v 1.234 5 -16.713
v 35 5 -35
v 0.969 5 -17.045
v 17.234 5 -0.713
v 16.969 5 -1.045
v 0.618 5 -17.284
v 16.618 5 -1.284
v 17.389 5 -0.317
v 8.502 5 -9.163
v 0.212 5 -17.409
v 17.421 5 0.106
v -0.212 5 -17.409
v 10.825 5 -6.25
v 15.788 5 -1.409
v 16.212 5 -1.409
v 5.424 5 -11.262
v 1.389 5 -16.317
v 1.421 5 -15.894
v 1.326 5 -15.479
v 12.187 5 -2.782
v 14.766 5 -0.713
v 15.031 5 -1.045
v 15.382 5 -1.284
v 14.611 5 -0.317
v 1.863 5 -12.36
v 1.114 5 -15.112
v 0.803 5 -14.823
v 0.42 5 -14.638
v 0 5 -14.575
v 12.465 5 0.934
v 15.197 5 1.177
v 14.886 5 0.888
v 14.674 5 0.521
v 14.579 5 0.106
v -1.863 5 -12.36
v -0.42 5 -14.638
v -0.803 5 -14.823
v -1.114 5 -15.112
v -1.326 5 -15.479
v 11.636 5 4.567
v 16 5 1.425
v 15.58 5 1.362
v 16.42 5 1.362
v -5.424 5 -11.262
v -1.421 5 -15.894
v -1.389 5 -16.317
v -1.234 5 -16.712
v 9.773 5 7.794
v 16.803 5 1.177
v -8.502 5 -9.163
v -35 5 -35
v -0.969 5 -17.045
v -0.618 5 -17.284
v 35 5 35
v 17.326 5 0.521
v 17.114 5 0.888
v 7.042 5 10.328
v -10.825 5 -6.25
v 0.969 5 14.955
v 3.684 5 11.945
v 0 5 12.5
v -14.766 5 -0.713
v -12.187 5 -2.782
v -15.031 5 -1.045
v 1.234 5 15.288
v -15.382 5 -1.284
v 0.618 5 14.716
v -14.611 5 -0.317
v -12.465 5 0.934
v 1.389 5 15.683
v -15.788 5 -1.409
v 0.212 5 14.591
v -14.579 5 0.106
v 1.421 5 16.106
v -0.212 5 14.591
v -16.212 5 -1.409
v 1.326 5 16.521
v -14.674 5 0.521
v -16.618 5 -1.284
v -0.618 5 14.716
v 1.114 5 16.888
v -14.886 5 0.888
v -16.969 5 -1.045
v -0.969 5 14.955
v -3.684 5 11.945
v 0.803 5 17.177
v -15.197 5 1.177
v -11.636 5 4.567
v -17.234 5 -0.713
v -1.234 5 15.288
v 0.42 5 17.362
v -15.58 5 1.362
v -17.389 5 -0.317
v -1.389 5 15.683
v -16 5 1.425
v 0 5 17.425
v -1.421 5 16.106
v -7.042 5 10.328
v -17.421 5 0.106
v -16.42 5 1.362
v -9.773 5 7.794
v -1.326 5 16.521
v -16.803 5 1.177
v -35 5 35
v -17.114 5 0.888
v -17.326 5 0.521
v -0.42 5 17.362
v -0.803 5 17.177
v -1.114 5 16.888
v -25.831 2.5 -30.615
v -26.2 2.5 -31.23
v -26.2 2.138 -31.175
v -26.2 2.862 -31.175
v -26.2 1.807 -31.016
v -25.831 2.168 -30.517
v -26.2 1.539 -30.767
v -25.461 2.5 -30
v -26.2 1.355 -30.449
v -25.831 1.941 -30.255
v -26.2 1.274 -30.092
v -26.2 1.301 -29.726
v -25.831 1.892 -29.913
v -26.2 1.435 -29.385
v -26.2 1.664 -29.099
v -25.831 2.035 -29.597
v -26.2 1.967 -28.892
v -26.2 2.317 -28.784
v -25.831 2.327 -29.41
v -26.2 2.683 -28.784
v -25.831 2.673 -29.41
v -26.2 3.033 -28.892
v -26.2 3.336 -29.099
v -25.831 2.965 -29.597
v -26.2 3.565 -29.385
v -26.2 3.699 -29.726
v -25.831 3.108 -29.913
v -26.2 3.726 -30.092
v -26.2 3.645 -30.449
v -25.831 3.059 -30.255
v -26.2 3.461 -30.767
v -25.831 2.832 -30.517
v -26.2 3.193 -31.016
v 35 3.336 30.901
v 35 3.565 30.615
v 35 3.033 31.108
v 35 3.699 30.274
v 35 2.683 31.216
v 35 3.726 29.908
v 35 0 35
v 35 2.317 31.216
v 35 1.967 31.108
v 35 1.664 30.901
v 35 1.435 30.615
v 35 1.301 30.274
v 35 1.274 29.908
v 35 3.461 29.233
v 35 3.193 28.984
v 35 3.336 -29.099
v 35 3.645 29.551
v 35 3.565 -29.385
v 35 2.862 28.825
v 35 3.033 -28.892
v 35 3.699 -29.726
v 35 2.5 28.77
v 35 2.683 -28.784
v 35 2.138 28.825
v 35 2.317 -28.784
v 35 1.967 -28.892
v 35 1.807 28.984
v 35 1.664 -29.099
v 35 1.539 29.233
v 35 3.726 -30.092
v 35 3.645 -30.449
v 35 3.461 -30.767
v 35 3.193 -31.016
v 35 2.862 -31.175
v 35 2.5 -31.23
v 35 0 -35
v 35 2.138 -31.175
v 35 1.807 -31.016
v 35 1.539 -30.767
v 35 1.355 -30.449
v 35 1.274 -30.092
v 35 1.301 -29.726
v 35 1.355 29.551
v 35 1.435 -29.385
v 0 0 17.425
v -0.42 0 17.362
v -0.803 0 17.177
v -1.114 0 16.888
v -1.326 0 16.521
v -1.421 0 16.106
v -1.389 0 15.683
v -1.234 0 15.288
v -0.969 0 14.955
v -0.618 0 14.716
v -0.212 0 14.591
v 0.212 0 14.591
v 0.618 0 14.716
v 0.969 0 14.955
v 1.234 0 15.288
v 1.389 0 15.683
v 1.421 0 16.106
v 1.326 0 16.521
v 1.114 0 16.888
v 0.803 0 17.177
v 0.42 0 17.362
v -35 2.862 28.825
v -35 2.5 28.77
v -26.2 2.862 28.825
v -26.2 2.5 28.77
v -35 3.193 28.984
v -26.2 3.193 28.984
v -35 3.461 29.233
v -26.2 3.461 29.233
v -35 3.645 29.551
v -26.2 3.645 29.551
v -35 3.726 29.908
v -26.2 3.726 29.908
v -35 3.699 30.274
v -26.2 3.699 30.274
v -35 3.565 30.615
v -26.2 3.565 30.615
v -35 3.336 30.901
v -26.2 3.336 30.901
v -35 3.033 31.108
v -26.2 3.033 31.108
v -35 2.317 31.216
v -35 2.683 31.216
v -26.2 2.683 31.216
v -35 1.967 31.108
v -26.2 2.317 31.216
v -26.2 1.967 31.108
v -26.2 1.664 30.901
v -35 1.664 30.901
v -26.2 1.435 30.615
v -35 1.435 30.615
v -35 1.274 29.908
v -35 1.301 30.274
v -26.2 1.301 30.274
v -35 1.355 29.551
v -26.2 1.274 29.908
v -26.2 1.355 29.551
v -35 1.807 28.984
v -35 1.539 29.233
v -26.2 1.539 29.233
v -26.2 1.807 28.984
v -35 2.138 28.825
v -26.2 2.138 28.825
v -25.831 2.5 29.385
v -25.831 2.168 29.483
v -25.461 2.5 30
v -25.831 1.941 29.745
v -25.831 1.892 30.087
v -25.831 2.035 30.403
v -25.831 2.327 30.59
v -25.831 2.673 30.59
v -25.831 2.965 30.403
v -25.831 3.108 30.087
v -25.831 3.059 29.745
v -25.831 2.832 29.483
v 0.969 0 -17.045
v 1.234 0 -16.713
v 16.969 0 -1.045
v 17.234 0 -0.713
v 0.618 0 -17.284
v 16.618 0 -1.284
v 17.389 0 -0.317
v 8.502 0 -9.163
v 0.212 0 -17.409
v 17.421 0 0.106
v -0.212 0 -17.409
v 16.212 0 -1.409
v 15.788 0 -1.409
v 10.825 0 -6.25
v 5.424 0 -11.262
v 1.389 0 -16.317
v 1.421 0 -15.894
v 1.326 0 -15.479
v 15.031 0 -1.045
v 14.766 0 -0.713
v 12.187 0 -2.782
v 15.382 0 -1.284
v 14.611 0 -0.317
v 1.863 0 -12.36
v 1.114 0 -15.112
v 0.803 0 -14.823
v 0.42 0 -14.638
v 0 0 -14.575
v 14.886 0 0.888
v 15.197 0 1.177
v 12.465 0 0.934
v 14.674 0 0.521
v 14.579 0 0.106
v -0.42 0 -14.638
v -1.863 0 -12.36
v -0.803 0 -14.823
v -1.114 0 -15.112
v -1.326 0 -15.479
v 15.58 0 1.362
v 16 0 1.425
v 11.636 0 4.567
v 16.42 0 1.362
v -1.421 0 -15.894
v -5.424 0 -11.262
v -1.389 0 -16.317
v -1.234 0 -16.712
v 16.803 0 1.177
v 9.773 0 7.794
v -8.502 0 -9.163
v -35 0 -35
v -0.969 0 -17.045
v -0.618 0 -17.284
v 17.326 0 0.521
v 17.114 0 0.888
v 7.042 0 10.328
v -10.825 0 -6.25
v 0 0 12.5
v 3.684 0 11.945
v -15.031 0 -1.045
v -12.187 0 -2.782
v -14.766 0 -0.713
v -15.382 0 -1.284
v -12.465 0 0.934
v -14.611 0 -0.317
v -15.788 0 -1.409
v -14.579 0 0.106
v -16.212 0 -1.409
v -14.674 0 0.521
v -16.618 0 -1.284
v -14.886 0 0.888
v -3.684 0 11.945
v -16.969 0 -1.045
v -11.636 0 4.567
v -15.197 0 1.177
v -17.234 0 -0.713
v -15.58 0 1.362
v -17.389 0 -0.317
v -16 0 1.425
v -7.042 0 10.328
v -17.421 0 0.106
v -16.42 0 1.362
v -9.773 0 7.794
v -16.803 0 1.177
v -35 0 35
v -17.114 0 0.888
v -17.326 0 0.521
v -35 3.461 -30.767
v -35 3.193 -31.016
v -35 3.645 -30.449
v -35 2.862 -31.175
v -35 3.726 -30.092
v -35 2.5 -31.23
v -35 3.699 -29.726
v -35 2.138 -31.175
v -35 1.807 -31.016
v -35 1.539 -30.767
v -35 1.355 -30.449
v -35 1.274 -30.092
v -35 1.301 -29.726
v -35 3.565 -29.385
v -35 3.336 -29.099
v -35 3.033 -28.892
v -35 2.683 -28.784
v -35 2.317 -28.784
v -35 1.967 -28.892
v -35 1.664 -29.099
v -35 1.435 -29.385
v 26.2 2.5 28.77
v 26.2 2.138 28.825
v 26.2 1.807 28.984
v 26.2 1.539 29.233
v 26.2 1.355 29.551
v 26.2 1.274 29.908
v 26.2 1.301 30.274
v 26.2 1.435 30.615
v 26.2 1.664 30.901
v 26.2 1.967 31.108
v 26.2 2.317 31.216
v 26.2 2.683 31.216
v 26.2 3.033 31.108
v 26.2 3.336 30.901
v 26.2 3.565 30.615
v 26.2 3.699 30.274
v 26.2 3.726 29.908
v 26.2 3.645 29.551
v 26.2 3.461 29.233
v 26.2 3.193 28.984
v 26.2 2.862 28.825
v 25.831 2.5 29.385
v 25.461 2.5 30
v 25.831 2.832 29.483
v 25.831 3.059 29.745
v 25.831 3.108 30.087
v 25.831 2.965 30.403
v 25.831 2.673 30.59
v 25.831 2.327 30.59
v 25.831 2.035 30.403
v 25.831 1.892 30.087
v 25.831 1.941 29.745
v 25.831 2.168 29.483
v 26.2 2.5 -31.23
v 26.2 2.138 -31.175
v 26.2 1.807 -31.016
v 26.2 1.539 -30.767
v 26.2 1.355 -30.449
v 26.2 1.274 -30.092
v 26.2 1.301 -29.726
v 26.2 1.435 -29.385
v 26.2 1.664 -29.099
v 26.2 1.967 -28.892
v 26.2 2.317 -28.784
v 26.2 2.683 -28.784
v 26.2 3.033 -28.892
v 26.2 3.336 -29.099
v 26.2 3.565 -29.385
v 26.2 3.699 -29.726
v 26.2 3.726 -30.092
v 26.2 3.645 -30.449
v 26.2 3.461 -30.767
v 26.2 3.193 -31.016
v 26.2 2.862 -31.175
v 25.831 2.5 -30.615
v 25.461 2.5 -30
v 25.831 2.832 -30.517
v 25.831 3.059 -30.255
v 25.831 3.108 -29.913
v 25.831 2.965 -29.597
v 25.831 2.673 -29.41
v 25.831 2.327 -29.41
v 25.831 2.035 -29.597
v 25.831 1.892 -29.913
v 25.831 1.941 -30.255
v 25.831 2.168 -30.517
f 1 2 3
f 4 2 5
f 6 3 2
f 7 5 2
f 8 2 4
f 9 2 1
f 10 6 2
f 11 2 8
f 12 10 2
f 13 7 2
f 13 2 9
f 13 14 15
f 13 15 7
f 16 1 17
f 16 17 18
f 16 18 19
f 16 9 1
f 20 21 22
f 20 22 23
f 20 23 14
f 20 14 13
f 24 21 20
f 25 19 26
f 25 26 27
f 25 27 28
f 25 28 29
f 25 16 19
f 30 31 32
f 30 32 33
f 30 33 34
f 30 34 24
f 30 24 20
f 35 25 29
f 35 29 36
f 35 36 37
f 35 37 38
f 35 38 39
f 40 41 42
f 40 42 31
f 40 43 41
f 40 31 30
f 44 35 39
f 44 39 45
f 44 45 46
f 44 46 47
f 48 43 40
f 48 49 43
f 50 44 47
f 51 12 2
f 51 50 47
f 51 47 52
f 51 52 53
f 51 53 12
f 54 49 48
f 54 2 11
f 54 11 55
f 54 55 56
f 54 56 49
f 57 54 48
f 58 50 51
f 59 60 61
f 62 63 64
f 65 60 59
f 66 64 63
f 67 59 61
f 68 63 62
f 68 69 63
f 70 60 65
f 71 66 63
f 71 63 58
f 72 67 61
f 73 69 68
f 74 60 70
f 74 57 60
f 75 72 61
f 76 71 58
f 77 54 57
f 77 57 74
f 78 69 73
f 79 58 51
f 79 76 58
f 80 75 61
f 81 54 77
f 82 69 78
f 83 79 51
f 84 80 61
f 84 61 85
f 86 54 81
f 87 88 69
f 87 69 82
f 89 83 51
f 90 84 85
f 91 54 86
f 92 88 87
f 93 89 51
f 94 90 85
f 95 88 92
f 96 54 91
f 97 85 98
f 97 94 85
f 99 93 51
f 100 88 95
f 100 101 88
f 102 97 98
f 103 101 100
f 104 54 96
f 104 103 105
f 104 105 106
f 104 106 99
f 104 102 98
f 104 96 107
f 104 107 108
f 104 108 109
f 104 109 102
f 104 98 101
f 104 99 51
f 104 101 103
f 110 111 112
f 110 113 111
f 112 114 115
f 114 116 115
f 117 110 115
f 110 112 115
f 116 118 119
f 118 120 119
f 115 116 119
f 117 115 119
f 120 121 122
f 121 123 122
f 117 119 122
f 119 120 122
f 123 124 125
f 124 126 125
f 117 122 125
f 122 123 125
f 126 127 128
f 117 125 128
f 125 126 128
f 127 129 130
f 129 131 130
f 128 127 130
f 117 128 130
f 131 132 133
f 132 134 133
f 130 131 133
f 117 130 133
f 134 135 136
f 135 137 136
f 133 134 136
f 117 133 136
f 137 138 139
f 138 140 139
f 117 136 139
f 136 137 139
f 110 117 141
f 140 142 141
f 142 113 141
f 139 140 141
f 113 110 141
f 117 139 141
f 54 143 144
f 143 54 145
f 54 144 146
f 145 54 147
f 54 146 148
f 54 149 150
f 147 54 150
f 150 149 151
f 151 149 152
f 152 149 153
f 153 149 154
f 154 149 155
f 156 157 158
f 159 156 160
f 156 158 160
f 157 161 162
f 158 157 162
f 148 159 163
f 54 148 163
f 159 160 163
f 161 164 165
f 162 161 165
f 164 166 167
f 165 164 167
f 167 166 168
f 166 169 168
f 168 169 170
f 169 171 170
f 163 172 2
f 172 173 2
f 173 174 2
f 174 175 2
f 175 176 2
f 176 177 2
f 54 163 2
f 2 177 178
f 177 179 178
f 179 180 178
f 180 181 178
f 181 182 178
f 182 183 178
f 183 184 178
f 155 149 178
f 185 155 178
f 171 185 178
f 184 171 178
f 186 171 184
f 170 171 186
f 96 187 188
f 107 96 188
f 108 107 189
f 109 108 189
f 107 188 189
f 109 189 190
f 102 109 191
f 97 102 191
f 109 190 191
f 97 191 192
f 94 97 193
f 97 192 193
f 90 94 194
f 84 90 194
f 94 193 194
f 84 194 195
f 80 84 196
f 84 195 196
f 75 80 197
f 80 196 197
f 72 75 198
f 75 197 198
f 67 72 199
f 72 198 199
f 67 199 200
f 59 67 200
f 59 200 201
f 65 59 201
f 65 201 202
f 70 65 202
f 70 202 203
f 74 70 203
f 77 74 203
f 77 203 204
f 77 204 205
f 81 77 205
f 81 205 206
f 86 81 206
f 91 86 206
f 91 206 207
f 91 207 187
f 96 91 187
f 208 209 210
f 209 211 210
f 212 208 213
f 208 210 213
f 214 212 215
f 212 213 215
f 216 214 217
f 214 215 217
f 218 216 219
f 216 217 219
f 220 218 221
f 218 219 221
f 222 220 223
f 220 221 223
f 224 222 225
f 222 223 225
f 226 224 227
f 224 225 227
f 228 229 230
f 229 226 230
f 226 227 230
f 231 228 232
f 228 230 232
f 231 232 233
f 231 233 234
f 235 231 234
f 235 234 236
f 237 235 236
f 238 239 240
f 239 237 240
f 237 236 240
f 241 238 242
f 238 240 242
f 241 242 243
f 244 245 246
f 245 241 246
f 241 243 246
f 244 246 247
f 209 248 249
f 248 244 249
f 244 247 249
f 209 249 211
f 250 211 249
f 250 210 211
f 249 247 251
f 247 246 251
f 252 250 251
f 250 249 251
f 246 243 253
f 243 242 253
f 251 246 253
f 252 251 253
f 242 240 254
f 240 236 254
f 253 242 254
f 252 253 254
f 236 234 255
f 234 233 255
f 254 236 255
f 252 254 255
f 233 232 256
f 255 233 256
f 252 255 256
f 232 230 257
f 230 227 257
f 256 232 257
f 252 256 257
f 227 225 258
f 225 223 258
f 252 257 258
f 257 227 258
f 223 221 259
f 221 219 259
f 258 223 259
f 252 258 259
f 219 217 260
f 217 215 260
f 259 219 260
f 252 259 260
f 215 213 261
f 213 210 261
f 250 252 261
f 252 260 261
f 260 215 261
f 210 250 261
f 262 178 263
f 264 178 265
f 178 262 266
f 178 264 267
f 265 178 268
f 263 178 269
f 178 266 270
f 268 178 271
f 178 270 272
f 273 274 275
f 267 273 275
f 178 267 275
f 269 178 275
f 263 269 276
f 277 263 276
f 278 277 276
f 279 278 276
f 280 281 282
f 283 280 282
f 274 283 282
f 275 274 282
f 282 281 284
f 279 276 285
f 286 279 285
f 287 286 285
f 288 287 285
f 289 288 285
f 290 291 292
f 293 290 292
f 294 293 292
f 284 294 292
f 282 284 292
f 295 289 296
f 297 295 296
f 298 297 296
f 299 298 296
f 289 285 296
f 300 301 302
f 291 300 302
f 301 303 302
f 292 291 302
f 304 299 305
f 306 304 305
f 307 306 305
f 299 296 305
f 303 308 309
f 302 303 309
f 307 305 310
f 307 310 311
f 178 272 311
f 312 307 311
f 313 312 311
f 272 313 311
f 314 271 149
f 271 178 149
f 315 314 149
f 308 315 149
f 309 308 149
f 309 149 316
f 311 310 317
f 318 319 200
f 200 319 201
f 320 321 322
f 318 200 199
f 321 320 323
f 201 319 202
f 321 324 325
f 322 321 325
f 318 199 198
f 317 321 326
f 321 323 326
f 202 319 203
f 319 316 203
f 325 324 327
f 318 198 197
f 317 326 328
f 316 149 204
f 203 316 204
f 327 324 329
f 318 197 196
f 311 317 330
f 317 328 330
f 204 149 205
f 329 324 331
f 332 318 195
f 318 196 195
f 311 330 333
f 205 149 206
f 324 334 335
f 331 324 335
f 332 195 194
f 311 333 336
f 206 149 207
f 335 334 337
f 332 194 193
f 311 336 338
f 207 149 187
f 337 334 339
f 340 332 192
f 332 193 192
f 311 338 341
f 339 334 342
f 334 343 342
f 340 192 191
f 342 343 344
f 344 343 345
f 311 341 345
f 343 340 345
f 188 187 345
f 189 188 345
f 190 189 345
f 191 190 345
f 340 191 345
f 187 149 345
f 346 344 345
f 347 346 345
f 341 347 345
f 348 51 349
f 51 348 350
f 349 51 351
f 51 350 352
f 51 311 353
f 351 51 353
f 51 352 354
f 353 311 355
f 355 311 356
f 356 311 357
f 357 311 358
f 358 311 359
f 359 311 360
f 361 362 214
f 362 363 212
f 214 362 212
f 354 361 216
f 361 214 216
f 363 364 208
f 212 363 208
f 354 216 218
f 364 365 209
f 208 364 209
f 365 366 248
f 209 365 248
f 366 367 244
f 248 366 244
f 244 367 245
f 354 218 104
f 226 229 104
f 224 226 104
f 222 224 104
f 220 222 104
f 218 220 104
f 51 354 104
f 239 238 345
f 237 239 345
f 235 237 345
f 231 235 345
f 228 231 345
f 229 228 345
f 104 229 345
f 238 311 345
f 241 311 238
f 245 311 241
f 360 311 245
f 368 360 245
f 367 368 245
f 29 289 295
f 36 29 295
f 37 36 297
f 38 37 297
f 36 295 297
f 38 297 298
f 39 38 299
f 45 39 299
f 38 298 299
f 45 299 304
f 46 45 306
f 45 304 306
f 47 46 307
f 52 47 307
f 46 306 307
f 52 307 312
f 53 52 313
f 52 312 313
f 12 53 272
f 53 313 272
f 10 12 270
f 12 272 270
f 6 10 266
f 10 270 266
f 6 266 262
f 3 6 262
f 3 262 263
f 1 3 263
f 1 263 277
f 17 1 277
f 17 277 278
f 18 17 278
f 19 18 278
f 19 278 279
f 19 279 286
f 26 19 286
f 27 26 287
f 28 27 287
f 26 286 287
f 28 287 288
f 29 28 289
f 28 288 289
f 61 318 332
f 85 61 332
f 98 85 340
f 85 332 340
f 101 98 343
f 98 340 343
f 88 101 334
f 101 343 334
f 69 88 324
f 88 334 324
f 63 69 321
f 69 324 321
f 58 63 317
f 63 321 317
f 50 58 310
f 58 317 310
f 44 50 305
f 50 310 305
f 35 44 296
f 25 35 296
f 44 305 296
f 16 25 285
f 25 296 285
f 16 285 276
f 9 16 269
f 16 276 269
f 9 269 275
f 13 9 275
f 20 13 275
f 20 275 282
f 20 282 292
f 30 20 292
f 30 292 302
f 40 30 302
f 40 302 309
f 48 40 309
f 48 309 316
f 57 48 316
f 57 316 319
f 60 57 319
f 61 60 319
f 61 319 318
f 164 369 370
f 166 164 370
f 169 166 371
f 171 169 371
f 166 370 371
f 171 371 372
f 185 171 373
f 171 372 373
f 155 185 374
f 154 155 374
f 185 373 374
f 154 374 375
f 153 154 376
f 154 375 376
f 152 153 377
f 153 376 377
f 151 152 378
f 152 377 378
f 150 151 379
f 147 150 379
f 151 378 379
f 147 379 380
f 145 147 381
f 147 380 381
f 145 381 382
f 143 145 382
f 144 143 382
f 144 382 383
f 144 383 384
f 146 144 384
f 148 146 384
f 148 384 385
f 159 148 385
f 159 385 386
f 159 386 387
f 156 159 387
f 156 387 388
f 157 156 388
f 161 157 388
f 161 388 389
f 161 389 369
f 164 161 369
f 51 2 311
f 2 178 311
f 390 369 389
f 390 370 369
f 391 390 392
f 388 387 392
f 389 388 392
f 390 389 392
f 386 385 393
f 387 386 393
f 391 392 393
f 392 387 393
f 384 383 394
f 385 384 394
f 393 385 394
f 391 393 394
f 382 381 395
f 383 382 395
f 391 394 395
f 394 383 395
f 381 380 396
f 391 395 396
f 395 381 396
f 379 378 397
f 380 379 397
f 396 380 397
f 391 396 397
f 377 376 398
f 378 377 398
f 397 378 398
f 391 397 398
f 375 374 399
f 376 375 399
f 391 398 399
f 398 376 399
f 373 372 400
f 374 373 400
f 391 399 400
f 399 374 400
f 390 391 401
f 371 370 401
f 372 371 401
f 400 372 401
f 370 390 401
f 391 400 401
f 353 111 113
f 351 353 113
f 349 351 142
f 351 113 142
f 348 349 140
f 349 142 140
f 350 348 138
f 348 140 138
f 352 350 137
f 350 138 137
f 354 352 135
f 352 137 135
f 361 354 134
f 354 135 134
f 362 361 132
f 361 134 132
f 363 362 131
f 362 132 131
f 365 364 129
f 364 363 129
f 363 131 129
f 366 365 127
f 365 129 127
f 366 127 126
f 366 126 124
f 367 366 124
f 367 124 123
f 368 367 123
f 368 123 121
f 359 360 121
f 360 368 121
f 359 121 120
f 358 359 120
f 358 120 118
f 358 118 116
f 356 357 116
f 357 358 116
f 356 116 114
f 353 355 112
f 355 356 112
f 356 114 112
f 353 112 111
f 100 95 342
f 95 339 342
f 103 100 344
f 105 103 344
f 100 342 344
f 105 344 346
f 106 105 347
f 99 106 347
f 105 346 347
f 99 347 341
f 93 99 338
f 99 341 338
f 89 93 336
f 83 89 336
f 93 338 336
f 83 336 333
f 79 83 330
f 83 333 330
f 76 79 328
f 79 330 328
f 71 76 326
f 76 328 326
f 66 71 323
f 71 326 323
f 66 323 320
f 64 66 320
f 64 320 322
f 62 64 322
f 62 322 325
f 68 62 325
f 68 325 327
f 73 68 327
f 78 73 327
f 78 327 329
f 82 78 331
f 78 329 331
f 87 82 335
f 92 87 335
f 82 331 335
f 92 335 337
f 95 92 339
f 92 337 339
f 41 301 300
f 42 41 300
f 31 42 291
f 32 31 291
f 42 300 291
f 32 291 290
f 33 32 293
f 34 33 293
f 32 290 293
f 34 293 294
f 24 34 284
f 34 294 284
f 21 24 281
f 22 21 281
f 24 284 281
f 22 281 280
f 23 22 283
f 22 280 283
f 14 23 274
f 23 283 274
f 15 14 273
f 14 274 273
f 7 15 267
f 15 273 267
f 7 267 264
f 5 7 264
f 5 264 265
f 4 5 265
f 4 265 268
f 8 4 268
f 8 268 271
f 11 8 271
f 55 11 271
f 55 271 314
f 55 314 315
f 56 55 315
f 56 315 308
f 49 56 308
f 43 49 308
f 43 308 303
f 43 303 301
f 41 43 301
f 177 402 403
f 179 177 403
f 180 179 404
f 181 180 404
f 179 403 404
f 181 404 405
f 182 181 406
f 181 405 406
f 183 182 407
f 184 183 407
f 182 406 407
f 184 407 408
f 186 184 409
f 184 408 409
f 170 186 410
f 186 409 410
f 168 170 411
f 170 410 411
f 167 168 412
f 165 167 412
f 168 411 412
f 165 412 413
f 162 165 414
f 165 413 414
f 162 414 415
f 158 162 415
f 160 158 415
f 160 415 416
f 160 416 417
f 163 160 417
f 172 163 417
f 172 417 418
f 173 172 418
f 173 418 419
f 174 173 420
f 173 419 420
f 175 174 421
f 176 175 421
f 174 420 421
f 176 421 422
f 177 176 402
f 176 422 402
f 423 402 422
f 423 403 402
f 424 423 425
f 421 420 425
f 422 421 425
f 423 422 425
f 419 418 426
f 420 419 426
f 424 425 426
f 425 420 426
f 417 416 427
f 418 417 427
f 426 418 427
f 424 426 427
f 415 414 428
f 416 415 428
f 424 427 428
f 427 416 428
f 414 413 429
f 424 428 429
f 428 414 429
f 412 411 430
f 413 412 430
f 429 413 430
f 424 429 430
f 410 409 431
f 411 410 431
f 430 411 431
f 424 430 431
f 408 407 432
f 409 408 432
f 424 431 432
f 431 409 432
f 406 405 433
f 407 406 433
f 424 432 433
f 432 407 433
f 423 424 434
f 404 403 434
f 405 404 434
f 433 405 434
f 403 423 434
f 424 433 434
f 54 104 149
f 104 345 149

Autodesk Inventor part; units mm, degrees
ref_plane "YZ Plane" through (0, 0, 0) normal (1, 0, 0) x (0, 1, 0)
ref_plane "XZ Plane" through (0, 0, 0) normal (0, 1, 0) x (-1, 0, 0)
sketch "Sketch1" plane through (0, 0, 0) normal (0, 1, 0) x (-1, 0, 0)
  line L0 (35, 35) -> (-35, 35)
  line L1 (-35, 35) -> (-35, -35)
  line L2 (-35, -35) -> (35, -35)
  line L3 (35, -35) -> (35, 35)
  line L4 (0, -49) -> (0, 49) projected
  line L5 (49, 0) -> (-49, 0) projected
  point P0 (0, 0)
  dimension "d0" = 70
  dimension "d1" = 70
  dimension "d2" = 70
extrude "Extrusion1" add sketch "Sketch1" along normal blind 5
sketch "Sketch2" plane through (35, 0, 35) normal (1, 0, 0) x (0, 0, -1)
  line L0 (0, 0) -> (70, 0) projected
  line L1 (70, 0) -> (70, 5) projected
  line L2 (35, 0) -> (35, 5)
  line L3 (0, 5) -> (70, 5) projected
  point P0 (65, 2.5)
  point P1 (5, 2.5)
  dimension "d5" = 2.5
  dimension "d6" = 5
hole "Hole1" at (35, 2.5, -30) at (35, 2.5, 30) direction (-1, 0, 0) diameter 2.459 depth 8.8 tip angle 118 thread size "M3x0.5" class "6H" standard "ANSI Metric M Profile"
sketch "Sketch3" plane through (0, 5, 0) normal (0, 1, 0) x (1, 0, 0)
  point P0 (0, 0)
  point P1 (0, 0)
hole "Hole2" at (0, 5, 0) direction (0, -1, 0) diameter 25 depth 10 tip angle 118
sketch "Sketch4" plane through (0, 5, 0) normal (0, 1, 0) x (1, 0, 0)
  point P0 (0, 0)
  point P1 (16, 0)
  point P2 (0, 16)
  point P3 (-16, 0)
  point P4 (0, -16)
  dimension "d21" = 16
  dimension "d24" = 360
sketch "Sketch5" plane through (0, 5, 0) normal (0, 1, 0) x (1, 0, 0)
  point P0 (0, 0)
hole "Hole3" at (-16, 5, 0) at (0, 5, -16) at (0, 5, 16) at (16, 5, 0) direction (0, -1, 0) diameter 2.85 depth 10.4 tip angle 118 thread size "M3.5x0.6" class "6H" standard "ANSI Metric M Profile"
ref_plane "Work Plane2" through (0, 0, -35) normal (-1, 0, 0) x (0, 0, 1)
mirror "Mirror2" about plane through (0, 0, -35) normal (-1, 0, 0) of "Hole1"
properties part number "상판" material "Aluminum 6061-AHC"
